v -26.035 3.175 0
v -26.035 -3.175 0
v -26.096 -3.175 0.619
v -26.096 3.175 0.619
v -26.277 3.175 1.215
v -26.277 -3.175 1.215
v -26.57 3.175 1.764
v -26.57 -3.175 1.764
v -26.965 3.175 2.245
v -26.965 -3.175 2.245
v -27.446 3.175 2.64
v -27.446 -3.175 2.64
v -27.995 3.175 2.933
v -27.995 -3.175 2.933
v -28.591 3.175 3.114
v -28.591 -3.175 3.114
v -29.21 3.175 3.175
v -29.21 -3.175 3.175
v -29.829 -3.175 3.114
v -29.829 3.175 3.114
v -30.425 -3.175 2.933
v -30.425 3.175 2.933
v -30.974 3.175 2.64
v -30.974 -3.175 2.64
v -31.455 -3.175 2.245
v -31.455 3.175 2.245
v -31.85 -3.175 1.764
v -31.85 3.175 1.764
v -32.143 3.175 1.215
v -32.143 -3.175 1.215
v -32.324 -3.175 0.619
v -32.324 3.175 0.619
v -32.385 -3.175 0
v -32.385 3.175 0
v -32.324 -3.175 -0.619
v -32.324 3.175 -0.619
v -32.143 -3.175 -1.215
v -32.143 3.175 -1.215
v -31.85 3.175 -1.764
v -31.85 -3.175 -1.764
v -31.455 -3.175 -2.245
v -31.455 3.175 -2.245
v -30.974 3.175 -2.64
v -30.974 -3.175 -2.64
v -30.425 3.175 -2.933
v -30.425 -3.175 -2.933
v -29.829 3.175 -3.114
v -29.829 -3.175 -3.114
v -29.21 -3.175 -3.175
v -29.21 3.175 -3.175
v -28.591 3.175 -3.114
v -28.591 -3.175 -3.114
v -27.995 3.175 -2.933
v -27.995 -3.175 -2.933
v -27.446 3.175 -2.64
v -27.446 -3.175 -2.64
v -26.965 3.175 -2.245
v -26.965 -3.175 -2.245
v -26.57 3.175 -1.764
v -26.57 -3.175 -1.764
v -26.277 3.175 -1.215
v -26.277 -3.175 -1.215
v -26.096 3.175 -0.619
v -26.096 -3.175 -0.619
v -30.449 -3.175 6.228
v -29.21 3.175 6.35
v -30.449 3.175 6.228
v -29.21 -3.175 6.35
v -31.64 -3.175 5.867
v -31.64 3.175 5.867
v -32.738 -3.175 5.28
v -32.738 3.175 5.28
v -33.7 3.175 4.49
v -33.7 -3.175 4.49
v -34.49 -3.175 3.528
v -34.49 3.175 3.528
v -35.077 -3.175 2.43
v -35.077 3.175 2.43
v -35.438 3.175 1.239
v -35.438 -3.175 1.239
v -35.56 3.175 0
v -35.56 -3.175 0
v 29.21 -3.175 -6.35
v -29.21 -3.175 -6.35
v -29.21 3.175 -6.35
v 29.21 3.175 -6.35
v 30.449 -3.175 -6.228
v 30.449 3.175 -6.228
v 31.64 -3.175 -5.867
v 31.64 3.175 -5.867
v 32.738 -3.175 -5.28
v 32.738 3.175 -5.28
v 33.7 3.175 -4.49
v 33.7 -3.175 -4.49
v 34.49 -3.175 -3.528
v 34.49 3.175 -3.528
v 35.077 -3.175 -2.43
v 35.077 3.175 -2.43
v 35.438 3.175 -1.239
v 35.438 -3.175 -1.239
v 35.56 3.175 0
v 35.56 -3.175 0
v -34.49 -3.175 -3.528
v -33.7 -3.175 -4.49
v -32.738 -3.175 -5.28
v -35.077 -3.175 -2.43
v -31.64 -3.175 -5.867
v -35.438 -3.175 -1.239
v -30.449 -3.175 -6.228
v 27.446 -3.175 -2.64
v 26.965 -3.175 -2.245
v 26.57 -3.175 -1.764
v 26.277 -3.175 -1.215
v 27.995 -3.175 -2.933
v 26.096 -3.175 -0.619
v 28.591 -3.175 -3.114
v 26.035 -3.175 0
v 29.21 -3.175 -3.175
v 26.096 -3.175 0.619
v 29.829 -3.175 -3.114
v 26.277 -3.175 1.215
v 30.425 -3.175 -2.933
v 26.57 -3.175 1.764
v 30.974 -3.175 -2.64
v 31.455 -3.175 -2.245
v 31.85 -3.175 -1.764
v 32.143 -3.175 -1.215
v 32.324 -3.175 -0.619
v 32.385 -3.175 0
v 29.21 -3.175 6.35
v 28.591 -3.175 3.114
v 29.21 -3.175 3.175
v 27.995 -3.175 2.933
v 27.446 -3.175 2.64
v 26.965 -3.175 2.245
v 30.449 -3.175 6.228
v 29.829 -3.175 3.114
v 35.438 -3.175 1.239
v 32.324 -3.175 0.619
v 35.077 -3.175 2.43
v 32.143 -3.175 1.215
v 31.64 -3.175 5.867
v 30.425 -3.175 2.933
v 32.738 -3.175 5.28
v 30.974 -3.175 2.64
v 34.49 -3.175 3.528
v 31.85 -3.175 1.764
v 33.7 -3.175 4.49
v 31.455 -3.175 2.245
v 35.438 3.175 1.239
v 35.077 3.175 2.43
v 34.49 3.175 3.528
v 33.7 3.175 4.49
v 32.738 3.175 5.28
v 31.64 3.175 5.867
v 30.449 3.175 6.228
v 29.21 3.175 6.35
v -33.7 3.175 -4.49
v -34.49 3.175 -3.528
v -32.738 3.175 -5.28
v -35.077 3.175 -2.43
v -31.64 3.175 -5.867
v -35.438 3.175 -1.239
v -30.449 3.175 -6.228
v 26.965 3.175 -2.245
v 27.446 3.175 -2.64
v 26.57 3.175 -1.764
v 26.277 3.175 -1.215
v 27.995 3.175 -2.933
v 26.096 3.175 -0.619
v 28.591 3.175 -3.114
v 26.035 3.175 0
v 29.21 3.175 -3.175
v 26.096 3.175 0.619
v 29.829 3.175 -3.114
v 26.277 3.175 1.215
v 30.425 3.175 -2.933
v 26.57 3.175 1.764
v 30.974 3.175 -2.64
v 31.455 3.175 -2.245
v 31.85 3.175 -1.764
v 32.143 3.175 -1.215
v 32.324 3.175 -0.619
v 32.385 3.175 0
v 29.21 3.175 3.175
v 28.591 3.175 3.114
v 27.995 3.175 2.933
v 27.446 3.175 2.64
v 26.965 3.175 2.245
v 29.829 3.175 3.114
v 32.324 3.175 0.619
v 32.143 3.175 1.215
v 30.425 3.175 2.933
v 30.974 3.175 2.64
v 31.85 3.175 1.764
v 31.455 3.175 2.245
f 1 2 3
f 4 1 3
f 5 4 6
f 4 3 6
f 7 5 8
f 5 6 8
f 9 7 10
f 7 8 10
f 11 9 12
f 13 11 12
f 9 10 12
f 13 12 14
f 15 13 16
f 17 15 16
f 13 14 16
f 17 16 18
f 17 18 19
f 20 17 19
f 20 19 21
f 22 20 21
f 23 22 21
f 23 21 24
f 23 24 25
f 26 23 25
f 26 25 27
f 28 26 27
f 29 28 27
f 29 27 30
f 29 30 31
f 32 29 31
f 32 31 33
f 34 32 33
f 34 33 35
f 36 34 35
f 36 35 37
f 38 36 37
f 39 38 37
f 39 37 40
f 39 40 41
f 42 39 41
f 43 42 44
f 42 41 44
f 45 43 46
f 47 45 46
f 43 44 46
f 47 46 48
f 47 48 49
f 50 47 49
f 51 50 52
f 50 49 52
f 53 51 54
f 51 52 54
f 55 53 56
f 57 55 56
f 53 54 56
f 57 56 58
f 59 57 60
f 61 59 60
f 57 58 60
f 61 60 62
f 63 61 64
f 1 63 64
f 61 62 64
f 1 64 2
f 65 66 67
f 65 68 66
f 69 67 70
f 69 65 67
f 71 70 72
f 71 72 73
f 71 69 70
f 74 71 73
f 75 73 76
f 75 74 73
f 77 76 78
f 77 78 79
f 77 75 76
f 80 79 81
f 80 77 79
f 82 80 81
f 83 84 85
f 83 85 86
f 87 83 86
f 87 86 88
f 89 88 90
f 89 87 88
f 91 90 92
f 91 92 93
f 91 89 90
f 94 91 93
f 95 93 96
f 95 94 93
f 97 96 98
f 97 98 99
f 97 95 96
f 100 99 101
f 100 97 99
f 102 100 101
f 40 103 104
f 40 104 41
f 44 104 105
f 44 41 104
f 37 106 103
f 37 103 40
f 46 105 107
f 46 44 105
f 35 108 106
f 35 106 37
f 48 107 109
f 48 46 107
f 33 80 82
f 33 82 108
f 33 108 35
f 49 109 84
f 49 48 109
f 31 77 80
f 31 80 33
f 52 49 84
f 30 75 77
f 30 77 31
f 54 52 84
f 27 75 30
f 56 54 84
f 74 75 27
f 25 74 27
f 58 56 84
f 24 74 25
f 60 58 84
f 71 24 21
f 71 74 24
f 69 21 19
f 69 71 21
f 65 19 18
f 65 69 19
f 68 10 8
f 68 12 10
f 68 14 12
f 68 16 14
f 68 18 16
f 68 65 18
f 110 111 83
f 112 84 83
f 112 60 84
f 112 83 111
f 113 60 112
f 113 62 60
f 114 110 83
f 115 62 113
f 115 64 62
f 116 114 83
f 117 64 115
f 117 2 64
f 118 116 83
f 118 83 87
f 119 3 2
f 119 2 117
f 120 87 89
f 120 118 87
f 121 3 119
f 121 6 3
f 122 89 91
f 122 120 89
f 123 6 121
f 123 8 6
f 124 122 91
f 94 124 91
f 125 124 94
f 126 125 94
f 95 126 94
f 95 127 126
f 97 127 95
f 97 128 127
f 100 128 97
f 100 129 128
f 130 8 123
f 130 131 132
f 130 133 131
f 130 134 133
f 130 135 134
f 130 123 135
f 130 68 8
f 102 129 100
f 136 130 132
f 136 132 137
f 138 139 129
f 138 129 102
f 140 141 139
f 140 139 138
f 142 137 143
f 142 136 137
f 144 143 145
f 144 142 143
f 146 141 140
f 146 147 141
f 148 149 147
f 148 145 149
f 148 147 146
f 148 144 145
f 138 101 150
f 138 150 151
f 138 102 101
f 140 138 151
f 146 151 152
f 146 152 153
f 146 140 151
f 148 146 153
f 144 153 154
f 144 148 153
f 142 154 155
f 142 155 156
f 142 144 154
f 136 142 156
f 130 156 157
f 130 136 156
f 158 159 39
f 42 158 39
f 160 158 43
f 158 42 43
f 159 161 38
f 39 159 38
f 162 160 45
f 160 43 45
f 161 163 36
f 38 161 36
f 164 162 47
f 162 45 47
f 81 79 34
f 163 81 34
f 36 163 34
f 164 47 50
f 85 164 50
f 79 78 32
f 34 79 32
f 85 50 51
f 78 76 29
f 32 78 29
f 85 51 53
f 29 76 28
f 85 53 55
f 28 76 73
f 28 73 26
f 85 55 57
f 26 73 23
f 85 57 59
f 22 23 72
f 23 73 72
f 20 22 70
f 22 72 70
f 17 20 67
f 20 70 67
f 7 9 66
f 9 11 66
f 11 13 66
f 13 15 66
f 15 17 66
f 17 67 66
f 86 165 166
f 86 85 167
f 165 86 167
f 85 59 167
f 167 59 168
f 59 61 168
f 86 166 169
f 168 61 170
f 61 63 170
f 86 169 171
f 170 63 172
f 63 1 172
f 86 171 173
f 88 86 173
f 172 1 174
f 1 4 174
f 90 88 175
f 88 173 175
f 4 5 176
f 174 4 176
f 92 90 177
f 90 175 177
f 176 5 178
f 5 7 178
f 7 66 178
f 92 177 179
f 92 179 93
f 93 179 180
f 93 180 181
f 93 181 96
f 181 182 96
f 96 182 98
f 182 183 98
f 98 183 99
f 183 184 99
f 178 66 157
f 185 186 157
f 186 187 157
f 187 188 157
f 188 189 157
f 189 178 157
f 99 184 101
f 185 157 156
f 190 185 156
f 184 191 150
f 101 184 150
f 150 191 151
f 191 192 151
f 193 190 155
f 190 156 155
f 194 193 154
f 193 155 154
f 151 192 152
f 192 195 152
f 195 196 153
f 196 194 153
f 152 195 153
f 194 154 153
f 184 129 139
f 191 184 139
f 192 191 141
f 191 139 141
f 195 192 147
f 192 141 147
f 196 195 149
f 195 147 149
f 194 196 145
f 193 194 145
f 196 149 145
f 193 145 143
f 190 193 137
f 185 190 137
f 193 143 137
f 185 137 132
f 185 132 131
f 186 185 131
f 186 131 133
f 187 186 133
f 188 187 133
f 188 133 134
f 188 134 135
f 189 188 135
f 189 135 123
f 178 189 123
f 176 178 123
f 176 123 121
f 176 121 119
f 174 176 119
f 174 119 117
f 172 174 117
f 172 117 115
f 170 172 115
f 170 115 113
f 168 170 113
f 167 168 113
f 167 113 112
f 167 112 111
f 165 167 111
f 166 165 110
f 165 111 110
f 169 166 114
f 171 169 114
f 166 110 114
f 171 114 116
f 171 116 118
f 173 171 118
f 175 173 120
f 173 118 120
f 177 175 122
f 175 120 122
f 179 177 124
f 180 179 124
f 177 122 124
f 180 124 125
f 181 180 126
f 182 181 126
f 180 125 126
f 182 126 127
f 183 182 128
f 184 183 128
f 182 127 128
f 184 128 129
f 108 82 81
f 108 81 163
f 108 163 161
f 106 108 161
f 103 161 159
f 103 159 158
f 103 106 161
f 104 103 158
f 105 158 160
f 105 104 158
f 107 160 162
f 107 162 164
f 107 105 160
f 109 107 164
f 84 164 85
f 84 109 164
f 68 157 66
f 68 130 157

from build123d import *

# Parameters (mm, degrees)
F1_DEPTH = 3.175
F2_R     = 3.175
F3_DEPTH = 6.351


with BuildPart() as f1:
    # F0 (on Front) → F1 (new body, symmetric)
    with BuildSketch(Plane.XZ):
        with BuildLine():
            Line((0, 6.35), (-29.21, 6.35))
            ThreePointArc((-29.21, 6.35), (-33.700128, 4.490128), (-35.56, 0))
            ThreePointArc((-35.56, 0), (-33.700128, -4.490128), (-29.21, -6.35))
            Line((-29.21, -6.35), (0, -6.35))
            Line((0, -6.35), (29.21, -6.35))
            ThreePointArc((29.21, -6.35), (33.700128, -4.490128), (35.56, 0))
            ThreePointArc((35.56, 0), (33.700128, 4.490128), (29.21, 6.35))
            Line((29.21, 6.35), (0, 6.35))
        make_face()
    extrude(amount=F1_DEPTH, both=True)

    # F2 (on face) → F3 (cut, through all)
    with BuildSketch(Plane.XZ.offset(3.175)):
        with Locations((-29.21, 0)):
            Circle(F2_R)
        with Locations((29.21, 0)):
            Circle(F2_R)
    extrude(amount=-F3_DEPTH, mode=Mode.SUBTRACT)


solid = f1.part
